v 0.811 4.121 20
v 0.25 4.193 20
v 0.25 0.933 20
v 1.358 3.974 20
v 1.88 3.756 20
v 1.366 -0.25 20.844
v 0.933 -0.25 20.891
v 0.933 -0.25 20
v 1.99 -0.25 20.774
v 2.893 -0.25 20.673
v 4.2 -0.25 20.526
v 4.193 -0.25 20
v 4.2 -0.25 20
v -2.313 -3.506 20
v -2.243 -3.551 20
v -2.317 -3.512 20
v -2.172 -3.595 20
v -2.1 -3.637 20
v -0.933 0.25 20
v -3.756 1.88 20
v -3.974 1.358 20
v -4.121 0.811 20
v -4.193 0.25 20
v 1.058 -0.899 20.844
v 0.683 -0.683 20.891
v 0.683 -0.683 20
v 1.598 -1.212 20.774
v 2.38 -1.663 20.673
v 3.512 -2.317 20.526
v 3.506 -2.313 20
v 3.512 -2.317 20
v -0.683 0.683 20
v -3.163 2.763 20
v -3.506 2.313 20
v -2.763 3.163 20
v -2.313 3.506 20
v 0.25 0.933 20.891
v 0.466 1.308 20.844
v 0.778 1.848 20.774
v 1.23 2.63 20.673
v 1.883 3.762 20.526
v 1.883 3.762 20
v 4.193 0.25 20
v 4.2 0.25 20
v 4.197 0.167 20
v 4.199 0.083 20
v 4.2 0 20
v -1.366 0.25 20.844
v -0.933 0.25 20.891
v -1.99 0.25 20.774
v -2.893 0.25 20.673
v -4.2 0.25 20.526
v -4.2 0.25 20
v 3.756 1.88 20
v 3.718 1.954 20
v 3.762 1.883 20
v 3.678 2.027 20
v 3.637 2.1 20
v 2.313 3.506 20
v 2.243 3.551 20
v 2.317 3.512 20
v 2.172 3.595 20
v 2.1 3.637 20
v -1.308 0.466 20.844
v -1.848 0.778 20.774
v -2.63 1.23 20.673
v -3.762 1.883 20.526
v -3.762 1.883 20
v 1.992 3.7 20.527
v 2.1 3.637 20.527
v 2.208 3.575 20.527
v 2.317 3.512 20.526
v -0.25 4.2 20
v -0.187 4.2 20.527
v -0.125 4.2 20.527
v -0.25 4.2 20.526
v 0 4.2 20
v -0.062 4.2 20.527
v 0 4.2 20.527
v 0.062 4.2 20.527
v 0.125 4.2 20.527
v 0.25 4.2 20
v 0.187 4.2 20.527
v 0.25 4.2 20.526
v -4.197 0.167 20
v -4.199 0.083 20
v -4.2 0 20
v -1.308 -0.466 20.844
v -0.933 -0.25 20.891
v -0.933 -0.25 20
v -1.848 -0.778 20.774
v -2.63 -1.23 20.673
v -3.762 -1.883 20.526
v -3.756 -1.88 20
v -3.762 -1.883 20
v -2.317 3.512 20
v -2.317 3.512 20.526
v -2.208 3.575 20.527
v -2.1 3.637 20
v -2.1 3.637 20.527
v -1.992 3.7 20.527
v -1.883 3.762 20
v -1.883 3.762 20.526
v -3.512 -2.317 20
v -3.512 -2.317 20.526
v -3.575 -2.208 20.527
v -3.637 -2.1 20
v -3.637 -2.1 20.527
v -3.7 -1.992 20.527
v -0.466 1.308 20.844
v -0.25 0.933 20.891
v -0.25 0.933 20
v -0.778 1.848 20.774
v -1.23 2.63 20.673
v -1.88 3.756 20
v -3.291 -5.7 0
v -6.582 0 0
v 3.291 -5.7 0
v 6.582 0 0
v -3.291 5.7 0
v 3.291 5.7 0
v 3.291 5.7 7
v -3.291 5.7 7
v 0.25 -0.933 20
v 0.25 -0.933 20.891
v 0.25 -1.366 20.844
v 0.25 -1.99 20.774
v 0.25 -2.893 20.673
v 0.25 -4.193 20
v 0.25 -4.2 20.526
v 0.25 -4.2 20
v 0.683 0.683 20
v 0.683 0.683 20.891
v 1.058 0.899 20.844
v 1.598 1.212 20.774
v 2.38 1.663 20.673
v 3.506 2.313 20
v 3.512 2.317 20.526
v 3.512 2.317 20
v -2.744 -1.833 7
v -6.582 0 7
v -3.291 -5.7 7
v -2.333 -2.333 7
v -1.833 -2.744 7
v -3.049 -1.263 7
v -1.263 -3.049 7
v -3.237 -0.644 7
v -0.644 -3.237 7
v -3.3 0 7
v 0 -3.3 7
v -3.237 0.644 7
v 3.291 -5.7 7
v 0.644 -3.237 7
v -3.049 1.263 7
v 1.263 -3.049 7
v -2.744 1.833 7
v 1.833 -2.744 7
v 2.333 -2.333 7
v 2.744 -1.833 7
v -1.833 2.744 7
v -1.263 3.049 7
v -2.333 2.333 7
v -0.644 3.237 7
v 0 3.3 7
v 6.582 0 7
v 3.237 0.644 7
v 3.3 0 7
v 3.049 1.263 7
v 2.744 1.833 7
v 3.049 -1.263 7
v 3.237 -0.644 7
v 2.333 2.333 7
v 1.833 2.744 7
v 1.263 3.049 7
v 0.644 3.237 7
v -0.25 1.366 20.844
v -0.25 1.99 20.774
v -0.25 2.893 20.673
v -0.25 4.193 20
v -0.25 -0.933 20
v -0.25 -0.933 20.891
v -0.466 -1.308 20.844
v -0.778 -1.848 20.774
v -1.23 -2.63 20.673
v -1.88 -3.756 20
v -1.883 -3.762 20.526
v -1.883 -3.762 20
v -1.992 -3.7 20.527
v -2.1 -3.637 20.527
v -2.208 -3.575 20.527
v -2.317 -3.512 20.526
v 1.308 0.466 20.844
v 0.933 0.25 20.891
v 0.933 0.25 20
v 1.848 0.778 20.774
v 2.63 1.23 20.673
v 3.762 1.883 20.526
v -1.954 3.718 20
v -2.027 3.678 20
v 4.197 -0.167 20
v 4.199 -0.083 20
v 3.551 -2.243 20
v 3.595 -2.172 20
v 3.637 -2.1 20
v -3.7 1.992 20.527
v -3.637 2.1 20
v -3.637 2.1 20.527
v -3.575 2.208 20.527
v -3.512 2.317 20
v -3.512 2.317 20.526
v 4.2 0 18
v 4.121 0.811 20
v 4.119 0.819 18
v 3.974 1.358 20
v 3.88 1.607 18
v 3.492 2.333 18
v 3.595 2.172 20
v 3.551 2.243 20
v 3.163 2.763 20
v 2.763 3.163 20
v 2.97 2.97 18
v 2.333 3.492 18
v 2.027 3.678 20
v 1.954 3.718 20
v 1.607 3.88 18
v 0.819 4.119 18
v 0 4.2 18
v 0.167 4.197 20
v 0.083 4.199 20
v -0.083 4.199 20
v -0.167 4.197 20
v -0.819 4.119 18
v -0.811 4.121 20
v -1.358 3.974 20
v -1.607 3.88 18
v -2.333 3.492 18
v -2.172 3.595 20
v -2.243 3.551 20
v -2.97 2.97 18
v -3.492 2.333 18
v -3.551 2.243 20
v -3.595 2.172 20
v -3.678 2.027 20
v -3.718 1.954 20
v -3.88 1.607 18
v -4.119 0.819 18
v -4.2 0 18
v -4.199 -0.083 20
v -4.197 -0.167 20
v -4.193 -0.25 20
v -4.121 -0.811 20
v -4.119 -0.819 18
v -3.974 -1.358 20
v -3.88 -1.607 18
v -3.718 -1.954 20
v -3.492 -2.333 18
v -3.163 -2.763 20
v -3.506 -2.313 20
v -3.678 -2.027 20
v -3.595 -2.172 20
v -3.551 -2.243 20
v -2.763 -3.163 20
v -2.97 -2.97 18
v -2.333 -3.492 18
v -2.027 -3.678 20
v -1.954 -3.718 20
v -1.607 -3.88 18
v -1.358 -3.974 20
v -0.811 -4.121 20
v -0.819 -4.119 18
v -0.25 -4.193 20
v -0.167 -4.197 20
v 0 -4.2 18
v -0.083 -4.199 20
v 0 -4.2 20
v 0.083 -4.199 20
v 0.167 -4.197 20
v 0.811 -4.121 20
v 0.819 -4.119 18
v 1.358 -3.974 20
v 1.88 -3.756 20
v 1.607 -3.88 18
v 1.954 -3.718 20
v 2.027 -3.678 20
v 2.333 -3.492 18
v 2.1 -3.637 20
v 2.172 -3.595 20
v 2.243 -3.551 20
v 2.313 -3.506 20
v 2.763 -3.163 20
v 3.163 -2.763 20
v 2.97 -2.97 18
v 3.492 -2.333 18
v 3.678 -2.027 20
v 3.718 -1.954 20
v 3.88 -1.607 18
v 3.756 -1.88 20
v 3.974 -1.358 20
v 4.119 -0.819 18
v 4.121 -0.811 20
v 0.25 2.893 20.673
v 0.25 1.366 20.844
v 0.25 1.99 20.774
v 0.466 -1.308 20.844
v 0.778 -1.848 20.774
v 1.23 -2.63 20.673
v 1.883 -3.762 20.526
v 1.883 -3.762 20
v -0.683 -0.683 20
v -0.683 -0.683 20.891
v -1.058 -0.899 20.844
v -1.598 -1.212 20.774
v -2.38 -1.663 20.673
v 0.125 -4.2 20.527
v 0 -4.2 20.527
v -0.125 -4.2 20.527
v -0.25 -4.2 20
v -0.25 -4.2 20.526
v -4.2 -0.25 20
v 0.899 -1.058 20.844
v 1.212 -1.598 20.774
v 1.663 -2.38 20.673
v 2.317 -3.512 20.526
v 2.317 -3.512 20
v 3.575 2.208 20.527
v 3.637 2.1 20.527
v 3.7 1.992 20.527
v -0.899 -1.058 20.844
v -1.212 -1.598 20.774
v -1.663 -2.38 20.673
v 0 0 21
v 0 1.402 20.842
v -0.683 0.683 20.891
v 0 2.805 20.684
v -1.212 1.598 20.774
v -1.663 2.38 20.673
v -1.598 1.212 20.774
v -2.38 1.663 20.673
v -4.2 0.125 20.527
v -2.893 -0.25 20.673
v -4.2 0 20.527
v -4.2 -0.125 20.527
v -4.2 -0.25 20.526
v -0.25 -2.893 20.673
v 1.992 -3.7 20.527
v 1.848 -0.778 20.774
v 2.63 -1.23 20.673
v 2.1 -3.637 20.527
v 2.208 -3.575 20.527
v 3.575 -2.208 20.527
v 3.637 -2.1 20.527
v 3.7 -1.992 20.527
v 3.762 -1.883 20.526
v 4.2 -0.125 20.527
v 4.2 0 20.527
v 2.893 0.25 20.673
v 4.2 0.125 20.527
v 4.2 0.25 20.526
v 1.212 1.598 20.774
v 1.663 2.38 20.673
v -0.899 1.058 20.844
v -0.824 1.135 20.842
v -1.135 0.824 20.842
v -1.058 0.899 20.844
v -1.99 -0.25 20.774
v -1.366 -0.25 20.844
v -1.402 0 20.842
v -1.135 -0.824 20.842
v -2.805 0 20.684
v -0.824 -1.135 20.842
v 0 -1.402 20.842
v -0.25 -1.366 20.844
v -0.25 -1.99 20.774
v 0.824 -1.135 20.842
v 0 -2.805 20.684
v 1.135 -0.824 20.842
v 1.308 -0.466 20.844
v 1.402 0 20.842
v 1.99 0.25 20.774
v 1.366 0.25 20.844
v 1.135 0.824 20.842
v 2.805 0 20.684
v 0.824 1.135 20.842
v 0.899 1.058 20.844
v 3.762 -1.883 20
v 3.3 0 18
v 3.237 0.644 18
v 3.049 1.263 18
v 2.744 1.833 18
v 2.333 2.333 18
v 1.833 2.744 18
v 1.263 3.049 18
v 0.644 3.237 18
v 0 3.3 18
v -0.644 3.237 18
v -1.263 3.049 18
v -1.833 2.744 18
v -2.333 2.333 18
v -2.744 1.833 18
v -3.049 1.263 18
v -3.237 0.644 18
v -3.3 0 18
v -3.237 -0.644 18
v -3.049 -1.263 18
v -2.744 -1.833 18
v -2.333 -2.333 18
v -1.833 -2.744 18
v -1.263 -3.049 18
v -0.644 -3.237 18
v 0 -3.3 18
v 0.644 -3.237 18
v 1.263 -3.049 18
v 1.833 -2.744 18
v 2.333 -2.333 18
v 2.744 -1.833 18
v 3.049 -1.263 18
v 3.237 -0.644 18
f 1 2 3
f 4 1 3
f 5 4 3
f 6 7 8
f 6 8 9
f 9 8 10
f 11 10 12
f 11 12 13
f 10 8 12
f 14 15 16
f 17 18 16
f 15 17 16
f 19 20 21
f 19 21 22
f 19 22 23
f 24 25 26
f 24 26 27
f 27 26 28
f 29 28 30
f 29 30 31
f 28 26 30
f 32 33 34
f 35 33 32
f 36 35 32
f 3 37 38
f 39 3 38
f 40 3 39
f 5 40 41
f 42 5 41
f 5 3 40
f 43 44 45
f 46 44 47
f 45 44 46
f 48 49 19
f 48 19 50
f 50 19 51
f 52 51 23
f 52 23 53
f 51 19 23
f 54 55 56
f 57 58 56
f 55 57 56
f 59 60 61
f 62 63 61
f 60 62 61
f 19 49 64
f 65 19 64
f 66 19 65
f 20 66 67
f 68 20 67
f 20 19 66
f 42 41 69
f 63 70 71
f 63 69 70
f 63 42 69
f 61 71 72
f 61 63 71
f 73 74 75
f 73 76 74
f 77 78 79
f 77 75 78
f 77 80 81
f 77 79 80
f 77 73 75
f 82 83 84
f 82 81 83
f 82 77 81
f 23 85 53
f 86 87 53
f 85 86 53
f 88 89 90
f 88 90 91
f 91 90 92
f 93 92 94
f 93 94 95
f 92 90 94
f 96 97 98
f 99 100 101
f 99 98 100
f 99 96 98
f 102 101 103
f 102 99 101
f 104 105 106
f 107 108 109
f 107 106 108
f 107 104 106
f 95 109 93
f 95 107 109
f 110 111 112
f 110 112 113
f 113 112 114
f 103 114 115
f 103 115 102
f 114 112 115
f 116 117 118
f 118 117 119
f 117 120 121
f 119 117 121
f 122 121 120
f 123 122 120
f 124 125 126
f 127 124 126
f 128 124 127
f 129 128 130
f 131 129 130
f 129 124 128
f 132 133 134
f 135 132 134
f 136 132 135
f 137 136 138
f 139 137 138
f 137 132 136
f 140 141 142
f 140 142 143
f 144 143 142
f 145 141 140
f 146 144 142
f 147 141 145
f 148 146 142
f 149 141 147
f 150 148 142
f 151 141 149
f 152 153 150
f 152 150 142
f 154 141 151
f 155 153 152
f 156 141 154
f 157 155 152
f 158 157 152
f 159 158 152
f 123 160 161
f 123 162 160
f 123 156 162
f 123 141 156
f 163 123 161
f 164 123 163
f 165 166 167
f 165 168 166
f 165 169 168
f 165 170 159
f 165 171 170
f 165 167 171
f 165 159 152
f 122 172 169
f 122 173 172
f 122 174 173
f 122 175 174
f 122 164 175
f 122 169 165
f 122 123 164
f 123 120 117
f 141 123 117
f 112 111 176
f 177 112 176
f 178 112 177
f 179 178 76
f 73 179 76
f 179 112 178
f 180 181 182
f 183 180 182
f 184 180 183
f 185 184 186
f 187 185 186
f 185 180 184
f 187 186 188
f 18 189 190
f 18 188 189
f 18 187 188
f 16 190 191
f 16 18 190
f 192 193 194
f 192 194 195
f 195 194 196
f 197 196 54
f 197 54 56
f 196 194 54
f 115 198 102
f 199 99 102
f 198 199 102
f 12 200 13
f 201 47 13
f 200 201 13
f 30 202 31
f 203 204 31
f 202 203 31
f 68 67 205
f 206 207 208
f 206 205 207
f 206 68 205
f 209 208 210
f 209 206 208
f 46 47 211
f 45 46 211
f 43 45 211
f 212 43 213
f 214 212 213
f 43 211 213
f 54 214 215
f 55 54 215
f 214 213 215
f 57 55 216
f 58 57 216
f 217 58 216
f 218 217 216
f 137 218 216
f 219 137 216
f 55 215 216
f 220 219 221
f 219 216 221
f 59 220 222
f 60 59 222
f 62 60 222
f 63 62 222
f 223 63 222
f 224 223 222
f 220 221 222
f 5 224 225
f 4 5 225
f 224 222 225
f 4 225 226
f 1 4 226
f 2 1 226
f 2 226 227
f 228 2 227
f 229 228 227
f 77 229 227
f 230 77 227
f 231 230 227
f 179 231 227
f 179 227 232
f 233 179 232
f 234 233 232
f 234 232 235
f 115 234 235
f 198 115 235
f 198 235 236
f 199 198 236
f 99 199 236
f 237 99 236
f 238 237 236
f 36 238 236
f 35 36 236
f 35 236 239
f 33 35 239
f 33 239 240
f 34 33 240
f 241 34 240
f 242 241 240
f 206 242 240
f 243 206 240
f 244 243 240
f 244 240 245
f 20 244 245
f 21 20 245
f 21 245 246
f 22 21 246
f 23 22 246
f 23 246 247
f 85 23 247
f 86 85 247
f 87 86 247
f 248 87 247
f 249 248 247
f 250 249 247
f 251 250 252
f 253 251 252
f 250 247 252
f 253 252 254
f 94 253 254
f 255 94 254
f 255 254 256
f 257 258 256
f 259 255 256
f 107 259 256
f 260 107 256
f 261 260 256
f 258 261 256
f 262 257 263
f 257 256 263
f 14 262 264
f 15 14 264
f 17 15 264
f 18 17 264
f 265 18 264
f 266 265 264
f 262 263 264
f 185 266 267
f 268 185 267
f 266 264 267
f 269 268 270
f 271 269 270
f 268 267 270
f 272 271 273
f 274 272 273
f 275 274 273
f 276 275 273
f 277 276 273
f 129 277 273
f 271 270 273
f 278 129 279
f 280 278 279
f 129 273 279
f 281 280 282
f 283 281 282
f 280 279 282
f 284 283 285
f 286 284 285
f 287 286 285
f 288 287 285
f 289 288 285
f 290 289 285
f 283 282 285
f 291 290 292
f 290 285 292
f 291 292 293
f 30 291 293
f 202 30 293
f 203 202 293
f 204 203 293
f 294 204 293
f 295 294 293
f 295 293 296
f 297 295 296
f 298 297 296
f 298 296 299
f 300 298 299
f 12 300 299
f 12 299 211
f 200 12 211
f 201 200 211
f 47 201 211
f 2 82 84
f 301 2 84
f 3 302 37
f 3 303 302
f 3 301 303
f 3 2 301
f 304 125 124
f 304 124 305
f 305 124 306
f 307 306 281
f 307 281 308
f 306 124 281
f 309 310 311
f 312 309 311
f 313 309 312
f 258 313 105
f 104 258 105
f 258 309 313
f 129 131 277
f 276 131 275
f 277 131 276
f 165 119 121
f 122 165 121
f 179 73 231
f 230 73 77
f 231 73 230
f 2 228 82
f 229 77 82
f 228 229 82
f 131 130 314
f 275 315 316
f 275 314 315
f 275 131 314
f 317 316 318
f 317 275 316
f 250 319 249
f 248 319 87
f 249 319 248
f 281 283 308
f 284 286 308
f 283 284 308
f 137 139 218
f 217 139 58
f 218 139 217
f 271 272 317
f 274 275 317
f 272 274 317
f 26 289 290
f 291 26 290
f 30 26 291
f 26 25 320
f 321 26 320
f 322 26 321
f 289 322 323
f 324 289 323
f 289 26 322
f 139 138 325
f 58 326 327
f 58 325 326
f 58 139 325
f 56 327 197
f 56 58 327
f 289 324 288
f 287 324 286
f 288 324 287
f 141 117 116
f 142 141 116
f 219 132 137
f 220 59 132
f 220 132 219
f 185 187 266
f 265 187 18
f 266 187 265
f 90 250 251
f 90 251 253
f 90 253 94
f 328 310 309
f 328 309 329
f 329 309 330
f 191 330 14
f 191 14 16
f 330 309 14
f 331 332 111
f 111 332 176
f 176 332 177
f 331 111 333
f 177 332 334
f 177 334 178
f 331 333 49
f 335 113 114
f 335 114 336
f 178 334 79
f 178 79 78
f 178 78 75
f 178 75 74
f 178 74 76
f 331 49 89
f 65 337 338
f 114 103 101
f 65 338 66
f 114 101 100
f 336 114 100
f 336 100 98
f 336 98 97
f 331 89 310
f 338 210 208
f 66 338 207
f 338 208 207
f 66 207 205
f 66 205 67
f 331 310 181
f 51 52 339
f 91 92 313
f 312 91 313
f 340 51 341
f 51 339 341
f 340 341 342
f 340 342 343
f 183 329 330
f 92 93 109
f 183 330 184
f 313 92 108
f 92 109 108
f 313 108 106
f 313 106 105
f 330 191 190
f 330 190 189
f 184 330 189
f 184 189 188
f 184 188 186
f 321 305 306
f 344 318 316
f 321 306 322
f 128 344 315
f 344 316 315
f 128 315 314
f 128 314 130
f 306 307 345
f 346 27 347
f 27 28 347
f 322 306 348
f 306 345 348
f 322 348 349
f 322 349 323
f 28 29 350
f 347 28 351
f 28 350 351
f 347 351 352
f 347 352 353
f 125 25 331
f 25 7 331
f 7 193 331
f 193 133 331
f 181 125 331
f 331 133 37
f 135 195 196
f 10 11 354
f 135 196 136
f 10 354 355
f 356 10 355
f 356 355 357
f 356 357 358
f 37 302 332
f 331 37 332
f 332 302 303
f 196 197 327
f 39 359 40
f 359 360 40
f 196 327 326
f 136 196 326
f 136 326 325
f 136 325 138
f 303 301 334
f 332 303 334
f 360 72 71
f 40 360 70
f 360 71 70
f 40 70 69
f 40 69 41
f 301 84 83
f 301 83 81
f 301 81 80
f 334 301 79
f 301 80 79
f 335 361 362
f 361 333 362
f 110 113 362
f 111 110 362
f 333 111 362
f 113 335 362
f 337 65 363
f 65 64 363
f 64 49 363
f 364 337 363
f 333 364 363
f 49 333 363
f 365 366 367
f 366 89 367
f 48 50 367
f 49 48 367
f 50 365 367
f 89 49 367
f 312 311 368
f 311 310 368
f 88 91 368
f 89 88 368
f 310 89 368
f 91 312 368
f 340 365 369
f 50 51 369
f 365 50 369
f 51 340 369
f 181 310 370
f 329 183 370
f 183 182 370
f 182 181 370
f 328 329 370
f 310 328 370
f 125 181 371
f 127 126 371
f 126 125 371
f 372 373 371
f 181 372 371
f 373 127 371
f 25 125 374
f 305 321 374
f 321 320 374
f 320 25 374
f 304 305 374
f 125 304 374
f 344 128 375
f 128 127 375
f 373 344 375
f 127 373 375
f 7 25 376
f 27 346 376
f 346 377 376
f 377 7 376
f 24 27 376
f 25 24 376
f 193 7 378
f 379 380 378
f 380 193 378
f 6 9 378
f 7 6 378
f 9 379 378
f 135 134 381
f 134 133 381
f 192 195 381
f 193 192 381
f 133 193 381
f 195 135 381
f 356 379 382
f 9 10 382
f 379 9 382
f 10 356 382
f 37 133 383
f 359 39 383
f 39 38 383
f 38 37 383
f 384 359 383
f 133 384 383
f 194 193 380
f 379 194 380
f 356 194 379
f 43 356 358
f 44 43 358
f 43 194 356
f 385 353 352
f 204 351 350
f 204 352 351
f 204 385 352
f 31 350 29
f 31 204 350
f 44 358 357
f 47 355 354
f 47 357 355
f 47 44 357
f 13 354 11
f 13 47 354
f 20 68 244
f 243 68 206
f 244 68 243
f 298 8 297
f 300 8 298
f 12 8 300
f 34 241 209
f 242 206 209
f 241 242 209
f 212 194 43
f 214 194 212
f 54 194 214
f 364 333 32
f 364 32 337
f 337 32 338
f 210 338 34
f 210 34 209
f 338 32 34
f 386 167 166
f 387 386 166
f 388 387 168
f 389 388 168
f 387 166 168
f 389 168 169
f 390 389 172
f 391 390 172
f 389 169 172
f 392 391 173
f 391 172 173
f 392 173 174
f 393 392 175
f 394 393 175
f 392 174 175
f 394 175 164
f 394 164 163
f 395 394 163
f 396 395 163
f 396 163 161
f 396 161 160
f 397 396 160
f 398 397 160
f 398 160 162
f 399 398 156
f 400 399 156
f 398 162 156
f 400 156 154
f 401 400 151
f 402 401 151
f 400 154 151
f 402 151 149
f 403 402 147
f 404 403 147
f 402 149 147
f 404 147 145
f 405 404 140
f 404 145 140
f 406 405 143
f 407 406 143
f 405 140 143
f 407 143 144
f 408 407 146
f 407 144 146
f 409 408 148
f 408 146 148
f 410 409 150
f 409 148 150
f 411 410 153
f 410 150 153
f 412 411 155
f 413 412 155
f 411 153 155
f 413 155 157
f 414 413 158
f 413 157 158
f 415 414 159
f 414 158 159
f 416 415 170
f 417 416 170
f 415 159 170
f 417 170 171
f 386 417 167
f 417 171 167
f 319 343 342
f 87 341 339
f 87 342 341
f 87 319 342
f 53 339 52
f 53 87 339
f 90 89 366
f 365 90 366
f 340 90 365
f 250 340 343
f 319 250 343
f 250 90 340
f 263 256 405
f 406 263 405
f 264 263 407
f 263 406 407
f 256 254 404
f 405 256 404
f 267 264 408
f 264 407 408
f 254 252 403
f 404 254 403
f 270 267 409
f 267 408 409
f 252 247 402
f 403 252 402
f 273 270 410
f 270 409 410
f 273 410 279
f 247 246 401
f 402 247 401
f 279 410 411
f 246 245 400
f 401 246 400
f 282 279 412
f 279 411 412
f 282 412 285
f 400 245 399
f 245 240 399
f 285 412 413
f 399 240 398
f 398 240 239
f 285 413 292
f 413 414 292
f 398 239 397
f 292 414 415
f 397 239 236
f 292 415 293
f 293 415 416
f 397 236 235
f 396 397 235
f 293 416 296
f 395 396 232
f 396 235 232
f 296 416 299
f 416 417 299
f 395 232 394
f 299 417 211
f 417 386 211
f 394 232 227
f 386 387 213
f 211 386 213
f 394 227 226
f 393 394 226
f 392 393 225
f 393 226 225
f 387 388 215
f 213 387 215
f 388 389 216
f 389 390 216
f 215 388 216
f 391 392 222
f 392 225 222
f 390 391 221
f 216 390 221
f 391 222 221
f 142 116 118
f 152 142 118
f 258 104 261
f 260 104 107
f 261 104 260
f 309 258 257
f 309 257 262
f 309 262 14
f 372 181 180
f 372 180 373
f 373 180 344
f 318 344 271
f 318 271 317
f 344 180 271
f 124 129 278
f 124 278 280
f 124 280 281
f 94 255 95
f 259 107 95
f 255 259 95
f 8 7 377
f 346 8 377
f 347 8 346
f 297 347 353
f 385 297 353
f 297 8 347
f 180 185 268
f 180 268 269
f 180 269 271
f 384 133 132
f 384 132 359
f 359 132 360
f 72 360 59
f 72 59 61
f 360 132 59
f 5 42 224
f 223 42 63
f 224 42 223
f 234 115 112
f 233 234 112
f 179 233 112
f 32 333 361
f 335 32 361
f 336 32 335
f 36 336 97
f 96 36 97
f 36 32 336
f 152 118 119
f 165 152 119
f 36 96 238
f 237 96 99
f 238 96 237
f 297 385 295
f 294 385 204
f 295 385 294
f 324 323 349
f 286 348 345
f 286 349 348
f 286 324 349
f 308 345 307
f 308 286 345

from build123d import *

# Parameters (mm, degrees)
PAD_DEPTH          = 7
SKETCH001_R        = 3.3
PAD001_DEPTH       = 11
SKETCH002_R        = 4.2
PAD002_DEPTH       = 2
SKETCH003_W        = 0.5
SKETCH003_H        = 4.2
PAD003_DEPTH       = 1
POLARPATTERN_COUNT = 12


with BuildPart() as part:
    # Sketch (on XY_Plane of Origin) → Pad (new body)
    with BuildSketch(Plane.XY):
        Polygon((6.581793, 0), (3.290897, 5.7), (-3.290897, 5.7), (-6.581793, 0), (-3.290897, -5.7), (3.290897, -5.7), align=None)
    extrude(amount=PAD_DEPTH)

    # Sketch001 (on Face8 of Pad) → Pad001 (join)
    with BuildSketch(Plane.XY.offset(7)):
        Circle(SKETCH001_R)
    extrude(amount=PAD001_DEPTH)

    # Sketch002 (on Face10 of Pad001) → Pad002 (join)
    with BuildSketch(Plane.XY.offset(18)):
        Circle(SKETCH002_R)
    extrude(amount=PAD002_DEPTH)

    # Sketch003 (on Face12 of Pad002) → Pad003 (join)
    with BuildSketch(Plane.XY.offset(20)):
        with Locations((0, 2.1)):
            Rectangle(SKETCH003_W, SKETCH003_H)
    pad003 = extrude(amount=PAD003_DEPTH)

    # PolarPattern: Pad003 ×12 about axis
    polarpattern_axis = Axis((0, 0, 20), (0, 0, 1))
    for i in range(1, POLARPATTERN_COUNT):
        add(pad003.rotate(polarpattern_axis, i * 360 / POLARPATTERN_COUNT))

    # Sketch004 (on YZ_Plane of Origin) → Groove (revolve, cut)
    with BuildSketch(Plane.YZ):
        Polygon((0, 21), (4.440189, 20.5), (4.440189, 21), align=None)
    revolve(axis=Axis((0, 0, 0), (0, 0, 1)), mode=Mode.SUBTRACT)


solid = part.part
